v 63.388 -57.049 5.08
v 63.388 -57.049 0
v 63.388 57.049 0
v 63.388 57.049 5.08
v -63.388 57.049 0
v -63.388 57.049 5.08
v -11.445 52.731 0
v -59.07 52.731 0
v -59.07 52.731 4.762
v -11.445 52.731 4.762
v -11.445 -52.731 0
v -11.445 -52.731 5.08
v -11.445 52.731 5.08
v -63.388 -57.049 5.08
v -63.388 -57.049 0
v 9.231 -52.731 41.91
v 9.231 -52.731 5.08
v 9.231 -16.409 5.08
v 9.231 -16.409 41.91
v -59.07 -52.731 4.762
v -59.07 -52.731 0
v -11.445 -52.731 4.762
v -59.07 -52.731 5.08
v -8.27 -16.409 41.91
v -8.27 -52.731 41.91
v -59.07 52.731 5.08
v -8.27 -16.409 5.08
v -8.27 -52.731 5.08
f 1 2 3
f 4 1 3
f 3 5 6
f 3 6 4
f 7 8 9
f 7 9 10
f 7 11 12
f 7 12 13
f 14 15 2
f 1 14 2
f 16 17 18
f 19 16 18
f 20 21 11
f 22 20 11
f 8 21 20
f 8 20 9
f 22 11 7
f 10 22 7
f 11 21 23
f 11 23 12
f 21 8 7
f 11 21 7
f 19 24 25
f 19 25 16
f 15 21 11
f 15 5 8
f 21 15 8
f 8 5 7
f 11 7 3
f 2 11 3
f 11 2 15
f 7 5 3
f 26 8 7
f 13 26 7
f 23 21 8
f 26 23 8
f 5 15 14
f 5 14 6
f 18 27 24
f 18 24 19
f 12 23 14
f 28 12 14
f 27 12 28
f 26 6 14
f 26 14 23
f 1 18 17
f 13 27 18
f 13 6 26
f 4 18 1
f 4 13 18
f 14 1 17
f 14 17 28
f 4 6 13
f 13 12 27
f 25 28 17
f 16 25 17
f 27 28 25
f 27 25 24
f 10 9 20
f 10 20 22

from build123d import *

# Parameters (mm, degrees)
F0_W     = 17.5006
F0_H     = 36.322
F1_DEPTH = 41.91
F0_W_2   = 126.77623
F0_H_2   = 114.098606
F0_W_3   = 47.62524
F0_H_3   = 105.462606
F2_DEPTH = 5.08
F0_W_4   = 41.27524
F0_H_4   = 99.112606
F3_DEPTH = 41.911
F4_DEPTH = 4.7625


with BuildPart() as f1:
    # F0 (on Top) → F1 (new body)
    with BuildSketch(Plane.XY):
        with Locations((0.480425, -34.570303)):
            Rectangle(F0_W, F0_H)
    extrude(amount=F1_DEPTH)

    # F0 (on Top) → F2 (join)
    with BuildSketch(Plane.XY):
        Rectangle(F0_W_2, F0_H_2)
        with Locations((0.480425, -34.570303)):
            Rectangle(F0_W, F0_H, mode=Mode.SUBTRACT)
        with Locations((-35.257495, 0)):
            Rectangle(F0_W_3, F0_H_3, mode=Mode.SUBTRACT)
    extrude(amount=F2_DEPTH)

    # F0 (on Top) → F3 (cut, through all)
    with BuildSketch(Plane.XY):
        with Locations((-35.257495, 0)):
            Rectangle(F0_W_4, F0_H_4)
    extrude(amount=F3_DEPTH, mode=Mode.SUBTRACT)


with BuildPart() as f4:
    # F0 (on Top) → F4 (new body)
    with BuildSketch(Plane.XY):
        with Locations((-35.257495, 0)):
            Rectangle(F0_W_3, F0_H_3)
        with Locations((-35.257495, 0)):
            Rectangle(F0_W_4, F0_H_4, mode=Mode.SUBTRACT)
        with Locations((-35.257495, 0)):
            Rectangle(F0_W_4, F0_H_4)
    extrude(amount=F4_DEPTH)


solid = Compound([f1.part, f4.part])
